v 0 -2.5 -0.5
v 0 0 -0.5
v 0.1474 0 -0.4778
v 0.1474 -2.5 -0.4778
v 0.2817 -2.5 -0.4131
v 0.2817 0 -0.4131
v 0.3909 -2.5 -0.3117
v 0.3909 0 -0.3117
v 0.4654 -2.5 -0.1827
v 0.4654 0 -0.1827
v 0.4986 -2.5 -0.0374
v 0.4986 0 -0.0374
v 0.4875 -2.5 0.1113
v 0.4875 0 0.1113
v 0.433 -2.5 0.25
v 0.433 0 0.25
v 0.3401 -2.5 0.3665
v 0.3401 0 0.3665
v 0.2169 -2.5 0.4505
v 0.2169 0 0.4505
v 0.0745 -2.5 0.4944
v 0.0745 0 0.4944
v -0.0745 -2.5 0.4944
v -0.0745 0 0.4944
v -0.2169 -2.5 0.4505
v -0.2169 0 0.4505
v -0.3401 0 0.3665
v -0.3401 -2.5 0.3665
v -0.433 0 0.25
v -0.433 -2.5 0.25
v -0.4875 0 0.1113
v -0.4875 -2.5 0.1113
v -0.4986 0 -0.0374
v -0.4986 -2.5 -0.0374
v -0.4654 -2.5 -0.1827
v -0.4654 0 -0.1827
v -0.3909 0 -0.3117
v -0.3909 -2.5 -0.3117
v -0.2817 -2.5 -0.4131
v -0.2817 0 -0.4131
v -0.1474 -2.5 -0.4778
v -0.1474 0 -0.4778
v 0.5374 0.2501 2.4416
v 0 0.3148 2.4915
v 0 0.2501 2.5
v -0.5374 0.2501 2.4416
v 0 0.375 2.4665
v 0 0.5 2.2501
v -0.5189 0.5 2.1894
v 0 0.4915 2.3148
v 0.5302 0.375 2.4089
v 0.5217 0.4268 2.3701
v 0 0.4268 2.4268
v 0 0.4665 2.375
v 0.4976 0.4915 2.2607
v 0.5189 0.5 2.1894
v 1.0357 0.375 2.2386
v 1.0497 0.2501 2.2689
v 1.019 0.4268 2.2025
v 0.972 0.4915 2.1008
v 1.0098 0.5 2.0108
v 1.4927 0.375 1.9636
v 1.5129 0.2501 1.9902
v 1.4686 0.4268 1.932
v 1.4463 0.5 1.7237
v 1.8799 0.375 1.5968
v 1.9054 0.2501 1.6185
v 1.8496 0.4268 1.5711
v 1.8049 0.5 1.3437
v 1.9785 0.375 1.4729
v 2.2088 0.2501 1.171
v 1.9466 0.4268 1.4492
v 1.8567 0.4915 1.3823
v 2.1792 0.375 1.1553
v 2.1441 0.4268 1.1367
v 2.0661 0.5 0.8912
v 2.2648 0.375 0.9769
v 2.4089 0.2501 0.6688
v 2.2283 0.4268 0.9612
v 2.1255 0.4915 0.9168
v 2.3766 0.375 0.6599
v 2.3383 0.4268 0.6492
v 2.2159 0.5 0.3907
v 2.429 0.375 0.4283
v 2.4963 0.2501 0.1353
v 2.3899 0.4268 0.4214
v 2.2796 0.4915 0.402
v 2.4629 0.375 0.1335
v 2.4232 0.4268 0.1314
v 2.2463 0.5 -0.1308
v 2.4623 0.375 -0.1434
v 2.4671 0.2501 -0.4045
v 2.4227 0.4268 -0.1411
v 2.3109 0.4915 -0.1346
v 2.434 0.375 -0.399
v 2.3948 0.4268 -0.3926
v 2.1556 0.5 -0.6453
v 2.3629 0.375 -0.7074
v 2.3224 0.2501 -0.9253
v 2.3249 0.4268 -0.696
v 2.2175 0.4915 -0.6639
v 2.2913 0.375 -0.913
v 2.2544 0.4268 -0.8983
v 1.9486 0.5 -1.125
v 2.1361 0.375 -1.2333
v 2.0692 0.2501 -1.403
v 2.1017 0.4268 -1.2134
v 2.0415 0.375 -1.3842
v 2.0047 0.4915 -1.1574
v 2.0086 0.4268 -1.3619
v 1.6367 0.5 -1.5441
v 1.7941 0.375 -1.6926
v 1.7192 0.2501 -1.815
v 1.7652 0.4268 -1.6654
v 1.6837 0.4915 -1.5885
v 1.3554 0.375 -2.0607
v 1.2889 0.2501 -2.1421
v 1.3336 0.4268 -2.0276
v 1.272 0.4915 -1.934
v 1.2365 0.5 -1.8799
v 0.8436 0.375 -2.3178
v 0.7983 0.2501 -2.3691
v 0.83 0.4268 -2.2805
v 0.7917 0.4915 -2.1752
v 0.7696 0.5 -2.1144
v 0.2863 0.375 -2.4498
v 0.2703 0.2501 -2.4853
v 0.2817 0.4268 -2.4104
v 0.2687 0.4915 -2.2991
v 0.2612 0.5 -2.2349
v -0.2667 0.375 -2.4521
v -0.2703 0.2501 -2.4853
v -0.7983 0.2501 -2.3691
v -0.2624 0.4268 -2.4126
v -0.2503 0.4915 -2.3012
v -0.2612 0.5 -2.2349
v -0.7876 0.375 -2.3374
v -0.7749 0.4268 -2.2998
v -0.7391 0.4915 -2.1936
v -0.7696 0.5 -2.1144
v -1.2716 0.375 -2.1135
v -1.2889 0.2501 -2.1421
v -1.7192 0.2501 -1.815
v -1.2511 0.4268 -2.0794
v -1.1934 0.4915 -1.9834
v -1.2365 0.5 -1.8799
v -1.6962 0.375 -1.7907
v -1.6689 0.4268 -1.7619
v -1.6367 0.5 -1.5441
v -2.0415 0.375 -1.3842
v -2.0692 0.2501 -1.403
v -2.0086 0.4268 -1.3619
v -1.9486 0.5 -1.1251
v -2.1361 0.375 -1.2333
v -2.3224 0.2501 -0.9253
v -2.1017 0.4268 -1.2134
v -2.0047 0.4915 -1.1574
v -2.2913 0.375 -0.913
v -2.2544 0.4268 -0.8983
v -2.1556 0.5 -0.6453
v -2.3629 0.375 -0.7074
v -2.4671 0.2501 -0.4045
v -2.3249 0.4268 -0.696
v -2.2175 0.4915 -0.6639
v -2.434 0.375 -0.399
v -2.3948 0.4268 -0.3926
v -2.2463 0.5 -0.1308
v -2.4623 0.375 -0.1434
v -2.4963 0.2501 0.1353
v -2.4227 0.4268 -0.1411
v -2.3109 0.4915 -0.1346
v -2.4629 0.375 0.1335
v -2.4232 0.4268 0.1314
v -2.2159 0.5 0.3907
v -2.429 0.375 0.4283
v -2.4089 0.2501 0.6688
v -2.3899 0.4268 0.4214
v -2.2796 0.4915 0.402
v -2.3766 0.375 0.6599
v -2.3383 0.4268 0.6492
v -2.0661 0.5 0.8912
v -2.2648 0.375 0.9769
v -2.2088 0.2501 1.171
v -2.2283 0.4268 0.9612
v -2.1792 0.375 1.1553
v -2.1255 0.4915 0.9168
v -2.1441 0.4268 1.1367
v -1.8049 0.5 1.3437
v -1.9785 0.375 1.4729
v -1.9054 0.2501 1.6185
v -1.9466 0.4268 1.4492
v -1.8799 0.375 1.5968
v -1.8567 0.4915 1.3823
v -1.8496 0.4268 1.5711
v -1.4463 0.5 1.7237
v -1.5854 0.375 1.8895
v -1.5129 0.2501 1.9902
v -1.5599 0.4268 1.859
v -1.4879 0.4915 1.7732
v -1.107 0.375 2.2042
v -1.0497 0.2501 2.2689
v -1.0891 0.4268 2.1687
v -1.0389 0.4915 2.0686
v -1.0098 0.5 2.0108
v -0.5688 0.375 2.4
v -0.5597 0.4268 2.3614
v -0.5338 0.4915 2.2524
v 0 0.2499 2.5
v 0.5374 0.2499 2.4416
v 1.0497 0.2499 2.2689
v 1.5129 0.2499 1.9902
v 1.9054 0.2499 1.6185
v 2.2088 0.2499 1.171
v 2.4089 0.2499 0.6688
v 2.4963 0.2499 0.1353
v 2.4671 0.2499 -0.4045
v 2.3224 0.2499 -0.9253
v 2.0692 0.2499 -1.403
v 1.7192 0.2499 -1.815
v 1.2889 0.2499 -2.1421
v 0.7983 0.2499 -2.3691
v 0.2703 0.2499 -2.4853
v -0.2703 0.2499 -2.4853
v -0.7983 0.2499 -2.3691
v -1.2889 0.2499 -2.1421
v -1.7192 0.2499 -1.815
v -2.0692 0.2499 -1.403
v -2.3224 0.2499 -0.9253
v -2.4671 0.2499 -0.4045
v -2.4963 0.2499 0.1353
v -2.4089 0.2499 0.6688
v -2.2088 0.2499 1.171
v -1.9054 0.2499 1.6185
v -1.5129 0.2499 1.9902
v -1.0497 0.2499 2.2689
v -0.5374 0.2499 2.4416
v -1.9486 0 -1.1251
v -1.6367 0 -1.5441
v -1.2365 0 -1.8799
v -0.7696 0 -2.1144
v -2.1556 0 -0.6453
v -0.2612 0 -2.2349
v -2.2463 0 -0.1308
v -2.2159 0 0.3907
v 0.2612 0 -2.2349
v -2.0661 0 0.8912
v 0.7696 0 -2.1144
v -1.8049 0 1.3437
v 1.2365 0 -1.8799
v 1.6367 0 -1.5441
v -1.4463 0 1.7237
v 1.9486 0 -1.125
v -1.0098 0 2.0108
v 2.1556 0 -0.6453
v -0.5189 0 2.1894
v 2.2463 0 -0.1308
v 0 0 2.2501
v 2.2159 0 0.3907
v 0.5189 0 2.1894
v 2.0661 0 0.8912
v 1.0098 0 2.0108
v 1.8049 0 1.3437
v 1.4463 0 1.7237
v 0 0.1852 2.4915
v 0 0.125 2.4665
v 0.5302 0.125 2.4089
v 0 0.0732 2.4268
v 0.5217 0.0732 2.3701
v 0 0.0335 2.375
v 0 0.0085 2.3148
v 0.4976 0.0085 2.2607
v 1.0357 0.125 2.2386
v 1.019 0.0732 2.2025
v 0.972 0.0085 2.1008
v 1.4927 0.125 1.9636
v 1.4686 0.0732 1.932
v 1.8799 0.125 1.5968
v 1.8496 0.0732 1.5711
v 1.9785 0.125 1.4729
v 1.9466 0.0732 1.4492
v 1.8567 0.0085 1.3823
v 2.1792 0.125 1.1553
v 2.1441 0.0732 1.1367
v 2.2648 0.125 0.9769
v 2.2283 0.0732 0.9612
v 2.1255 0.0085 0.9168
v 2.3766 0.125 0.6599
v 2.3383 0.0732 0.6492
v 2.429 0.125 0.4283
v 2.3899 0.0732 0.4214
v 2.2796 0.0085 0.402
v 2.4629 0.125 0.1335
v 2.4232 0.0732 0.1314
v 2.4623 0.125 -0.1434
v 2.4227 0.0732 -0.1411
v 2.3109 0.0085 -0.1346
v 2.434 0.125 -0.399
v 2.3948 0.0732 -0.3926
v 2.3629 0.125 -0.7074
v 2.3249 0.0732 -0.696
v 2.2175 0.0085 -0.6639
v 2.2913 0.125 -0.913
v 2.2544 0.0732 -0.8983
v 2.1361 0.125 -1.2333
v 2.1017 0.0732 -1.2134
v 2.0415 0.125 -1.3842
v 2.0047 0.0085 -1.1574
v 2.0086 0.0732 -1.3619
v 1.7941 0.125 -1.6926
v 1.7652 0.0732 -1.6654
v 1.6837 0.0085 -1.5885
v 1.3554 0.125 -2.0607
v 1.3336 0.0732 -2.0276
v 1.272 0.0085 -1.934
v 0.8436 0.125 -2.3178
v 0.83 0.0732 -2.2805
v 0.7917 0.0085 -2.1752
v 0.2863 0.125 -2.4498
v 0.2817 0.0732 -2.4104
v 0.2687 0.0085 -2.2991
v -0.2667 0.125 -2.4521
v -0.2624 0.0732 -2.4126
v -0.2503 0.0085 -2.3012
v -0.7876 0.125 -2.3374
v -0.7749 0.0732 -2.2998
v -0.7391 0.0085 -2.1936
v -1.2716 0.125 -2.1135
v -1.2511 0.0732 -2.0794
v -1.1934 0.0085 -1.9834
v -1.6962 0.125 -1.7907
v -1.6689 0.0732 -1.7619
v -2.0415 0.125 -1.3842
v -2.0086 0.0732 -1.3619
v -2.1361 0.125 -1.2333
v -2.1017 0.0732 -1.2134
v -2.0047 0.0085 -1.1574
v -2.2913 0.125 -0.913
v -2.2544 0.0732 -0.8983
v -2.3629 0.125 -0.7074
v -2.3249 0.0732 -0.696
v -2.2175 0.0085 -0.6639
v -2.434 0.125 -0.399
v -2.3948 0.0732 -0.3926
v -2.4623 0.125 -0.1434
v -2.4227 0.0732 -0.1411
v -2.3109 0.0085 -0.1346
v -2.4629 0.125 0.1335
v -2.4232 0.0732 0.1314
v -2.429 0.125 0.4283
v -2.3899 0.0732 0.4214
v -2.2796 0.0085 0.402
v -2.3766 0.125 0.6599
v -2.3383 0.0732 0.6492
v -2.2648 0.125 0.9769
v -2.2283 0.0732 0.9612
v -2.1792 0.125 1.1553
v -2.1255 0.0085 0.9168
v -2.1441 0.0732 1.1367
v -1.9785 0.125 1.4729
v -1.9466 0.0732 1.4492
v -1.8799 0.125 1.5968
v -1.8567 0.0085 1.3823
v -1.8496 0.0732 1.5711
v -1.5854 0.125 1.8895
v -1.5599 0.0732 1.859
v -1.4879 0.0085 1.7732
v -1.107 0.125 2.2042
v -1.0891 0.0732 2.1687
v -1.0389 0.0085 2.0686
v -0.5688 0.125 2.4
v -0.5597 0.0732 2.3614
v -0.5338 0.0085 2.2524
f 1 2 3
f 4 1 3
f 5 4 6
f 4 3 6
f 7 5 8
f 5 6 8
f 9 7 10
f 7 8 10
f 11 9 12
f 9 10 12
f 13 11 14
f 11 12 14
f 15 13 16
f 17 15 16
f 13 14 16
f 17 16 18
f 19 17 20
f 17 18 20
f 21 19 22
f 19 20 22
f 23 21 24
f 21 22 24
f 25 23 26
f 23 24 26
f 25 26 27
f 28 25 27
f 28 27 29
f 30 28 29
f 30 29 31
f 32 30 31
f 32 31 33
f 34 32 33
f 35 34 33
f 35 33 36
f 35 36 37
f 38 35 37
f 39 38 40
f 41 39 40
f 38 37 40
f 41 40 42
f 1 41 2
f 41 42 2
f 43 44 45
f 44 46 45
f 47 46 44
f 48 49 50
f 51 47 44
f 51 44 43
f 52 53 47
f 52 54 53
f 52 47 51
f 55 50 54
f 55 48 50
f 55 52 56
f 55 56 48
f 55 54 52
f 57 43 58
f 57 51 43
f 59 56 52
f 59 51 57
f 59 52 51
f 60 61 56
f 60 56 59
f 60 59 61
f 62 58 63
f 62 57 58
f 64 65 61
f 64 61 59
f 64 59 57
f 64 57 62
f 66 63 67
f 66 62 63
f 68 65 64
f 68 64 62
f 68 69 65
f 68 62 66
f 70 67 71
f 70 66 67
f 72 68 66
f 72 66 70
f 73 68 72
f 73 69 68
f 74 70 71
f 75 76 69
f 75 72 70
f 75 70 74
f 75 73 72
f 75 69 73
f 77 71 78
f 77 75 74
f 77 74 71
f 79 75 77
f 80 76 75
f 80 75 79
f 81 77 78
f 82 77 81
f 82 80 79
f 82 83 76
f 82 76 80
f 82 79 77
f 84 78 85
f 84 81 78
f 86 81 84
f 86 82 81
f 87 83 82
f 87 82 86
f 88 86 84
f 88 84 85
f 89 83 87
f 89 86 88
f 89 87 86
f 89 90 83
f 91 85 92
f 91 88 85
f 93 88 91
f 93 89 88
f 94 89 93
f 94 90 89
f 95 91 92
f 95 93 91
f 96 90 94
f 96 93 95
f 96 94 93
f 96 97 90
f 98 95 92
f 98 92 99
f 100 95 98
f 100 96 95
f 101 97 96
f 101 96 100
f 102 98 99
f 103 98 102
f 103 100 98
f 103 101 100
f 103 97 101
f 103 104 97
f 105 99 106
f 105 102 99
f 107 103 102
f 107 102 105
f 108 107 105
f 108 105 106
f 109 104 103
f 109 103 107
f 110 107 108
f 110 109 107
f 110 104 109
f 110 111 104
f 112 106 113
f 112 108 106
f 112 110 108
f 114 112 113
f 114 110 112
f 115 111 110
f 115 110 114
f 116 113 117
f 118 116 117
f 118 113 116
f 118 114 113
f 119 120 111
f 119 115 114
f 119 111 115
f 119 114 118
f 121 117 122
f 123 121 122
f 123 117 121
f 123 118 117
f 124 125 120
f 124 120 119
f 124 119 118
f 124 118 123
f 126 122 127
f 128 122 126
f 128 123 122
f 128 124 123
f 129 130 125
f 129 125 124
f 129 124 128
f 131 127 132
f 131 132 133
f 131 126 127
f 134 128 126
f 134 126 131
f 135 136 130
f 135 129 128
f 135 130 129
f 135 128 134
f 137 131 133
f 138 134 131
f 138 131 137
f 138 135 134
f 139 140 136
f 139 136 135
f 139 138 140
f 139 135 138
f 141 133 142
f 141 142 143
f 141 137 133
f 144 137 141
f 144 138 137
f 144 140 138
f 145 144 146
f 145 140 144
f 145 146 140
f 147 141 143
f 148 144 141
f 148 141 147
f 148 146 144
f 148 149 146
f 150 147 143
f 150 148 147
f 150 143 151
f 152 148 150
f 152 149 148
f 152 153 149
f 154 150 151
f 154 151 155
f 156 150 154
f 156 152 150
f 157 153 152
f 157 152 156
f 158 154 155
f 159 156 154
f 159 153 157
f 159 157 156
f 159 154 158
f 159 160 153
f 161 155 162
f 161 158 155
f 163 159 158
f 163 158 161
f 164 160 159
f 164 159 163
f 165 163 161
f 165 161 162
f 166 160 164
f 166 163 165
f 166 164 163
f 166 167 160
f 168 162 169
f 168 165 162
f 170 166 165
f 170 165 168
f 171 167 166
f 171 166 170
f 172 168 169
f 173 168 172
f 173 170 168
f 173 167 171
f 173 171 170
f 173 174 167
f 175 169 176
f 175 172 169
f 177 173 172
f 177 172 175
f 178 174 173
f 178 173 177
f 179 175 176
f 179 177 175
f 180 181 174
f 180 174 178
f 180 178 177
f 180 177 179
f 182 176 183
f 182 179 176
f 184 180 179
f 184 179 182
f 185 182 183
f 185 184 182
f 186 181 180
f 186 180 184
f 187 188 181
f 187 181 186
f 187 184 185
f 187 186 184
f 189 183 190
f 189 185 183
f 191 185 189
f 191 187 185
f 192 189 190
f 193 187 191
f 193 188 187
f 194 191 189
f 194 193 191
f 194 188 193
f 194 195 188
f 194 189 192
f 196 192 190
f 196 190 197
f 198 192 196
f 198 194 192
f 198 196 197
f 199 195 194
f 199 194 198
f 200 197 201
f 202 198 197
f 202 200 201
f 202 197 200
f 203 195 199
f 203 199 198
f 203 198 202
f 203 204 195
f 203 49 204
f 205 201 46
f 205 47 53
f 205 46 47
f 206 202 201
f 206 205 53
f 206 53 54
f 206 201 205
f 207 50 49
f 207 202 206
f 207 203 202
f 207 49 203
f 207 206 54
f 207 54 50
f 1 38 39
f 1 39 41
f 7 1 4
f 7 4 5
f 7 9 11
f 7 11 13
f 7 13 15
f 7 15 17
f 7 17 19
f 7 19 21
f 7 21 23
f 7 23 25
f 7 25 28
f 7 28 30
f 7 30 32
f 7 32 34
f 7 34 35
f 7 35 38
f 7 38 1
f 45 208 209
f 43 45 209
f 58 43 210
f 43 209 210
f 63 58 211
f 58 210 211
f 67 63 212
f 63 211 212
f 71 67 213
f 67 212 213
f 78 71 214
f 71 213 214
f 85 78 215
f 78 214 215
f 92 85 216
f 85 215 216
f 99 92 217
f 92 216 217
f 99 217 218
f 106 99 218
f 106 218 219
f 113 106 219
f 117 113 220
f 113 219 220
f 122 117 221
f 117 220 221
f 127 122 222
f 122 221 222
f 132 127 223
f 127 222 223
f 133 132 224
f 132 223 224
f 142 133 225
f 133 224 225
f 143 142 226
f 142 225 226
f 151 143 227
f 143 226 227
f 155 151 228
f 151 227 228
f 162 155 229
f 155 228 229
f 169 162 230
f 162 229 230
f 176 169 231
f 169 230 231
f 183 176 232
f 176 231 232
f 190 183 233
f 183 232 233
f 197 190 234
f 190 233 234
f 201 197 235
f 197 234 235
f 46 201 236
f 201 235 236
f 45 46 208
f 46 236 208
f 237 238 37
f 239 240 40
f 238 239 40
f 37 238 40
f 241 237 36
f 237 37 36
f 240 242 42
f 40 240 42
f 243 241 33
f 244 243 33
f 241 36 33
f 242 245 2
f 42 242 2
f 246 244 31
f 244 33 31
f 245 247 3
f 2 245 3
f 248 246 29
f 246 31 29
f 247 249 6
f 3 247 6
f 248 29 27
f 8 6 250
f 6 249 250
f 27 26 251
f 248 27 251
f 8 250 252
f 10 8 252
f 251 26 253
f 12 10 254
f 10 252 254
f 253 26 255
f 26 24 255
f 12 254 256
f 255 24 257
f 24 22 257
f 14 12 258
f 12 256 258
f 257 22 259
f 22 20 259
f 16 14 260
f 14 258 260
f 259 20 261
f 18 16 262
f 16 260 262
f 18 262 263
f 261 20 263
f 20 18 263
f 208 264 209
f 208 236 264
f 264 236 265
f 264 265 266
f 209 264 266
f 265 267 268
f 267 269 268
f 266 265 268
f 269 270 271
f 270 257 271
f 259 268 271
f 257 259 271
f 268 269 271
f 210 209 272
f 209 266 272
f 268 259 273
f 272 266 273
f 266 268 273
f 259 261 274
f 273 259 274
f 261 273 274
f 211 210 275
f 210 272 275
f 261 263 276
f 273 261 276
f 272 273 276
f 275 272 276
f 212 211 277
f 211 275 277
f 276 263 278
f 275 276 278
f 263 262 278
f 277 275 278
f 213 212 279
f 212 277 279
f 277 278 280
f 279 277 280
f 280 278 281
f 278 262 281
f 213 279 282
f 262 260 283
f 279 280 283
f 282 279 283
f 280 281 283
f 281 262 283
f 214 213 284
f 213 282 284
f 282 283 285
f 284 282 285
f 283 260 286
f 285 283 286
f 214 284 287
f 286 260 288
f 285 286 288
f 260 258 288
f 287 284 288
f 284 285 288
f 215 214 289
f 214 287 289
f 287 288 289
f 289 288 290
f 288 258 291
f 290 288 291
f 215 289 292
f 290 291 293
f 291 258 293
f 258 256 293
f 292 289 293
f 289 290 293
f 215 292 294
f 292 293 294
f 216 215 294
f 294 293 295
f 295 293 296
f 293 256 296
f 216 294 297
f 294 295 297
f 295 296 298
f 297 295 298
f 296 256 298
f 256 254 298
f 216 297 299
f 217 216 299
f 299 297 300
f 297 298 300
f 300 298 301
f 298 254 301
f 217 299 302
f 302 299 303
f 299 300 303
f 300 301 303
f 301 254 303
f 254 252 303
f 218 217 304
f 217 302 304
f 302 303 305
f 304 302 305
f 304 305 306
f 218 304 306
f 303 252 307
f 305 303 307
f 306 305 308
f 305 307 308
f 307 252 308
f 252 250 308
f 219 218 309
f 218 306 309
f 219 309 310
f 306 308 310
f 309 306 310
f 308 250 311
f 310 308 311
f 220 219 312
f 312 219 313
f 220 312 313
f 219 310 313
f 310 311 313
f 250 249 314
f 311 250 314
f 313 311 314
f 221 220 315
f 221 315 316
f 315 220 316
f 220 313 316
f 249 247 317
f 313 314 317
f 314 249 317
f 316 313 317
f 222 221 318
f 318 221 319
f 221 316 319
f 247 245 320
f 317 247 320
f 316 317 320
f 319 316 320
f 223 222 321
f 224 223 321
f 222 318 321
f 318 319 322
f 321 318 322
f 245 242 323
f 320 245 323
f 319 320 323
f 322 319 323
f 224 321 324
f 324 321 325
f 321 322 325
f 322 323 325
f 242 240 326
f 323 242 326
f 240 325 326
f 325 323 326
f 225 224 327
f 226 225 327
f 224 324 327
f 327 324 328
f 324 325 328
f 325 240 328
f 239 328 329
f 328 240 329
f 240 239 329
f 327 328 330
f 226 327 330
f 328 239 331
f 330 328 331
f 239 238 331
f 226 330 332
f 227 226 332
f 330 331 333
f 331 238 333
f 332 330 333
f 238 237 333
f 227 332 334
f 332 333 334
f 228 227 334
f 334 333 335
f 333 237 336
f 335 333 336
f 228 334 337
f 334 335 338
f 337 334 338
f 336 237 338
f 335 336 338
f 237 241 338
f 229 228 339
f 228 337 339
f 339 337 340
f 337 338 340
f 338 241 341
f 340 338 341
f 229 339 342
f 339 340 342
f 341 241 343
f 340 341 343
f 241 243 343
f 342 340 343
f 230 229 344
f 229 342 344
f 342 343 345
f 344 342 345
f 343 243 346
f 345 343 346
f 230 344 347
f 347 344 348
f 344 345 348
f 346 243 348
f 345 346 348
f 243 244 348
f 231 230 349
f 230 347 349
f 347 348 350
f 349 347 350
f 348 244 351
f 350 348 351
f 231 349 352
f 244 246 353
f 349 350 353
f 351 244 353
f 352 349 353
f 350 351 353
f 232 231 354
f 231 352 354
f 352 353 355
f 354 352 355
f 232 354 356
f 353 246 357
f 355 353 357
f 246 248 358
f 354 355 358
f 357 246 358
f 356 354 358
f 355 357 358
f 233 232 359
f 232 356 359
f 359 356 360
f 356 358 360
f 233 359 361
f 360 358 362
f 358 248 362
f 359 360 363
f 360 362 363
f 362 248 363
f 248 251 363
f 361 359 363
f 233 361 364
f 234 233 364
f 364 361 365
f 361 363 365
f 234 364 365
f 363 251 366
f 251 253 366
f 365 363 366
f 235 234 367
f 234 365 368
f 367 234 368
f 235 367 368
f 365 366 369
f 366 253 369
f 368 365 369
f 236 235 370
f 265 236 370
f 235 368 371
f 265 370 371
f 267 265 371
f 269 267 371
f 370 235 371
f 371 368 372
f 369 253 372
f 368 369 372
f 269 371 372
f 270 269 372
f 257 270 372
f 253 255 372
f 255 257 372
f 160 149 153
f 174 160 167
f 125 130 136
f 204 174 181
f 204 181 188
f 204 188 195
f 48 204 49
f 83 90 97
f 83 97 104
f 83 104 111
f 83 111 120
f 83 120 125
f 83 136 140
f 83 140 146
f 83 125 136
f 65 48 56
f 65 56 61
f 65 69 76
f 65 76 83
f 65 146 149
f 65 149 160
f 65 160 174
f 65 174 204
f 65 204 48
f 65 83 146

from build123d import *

# Parameters (mm, degrees)
SKETCH2_R           = 2.5
BOSS_EXTRUDE1_DEPTH = 0.5
SKETCH3_R           = 0.5
BOSS_EXTRUDE2_DEPTH = 2.5
FILLET1_R           = 0.25


with BuildPart() as part:
    # Sketch2 → Boss-Extrude1 (new body)
    with BuildSketch(Plane(origin=(0, 0, 0), x_dir=(1, 0, 0), z_dir=(0, 1, 0))):
        with Locations(Location((0, 0, 0), (0, 0, 270))):
            Circle(SKETCH2_R)
    extrude(amount=BOSS_EXTRUDE1_DEPTH)

    # Sketch3 → Boss-Extrude2 (add)
    with BuildSketch(Plane.XZ):
        with Locations(Location((0, 0, 0), (0, 0, 270))):
            Circle(SKETCH3_R)
    extrude(amount=BOSS_EXTRUDE2_DEPTH)

    # Fillet1
    fillet1_edges = [part.edges().sort_by_distance(p)[0] for p in [
        (0, 0, -2.5),
        (0, 0.5, -2.5),
    ]]
    fillet(fillet1_edges, radius=FILLET1_R - 0.0001)  # a hair under: the kernel refuses the full size


solid = part.part
